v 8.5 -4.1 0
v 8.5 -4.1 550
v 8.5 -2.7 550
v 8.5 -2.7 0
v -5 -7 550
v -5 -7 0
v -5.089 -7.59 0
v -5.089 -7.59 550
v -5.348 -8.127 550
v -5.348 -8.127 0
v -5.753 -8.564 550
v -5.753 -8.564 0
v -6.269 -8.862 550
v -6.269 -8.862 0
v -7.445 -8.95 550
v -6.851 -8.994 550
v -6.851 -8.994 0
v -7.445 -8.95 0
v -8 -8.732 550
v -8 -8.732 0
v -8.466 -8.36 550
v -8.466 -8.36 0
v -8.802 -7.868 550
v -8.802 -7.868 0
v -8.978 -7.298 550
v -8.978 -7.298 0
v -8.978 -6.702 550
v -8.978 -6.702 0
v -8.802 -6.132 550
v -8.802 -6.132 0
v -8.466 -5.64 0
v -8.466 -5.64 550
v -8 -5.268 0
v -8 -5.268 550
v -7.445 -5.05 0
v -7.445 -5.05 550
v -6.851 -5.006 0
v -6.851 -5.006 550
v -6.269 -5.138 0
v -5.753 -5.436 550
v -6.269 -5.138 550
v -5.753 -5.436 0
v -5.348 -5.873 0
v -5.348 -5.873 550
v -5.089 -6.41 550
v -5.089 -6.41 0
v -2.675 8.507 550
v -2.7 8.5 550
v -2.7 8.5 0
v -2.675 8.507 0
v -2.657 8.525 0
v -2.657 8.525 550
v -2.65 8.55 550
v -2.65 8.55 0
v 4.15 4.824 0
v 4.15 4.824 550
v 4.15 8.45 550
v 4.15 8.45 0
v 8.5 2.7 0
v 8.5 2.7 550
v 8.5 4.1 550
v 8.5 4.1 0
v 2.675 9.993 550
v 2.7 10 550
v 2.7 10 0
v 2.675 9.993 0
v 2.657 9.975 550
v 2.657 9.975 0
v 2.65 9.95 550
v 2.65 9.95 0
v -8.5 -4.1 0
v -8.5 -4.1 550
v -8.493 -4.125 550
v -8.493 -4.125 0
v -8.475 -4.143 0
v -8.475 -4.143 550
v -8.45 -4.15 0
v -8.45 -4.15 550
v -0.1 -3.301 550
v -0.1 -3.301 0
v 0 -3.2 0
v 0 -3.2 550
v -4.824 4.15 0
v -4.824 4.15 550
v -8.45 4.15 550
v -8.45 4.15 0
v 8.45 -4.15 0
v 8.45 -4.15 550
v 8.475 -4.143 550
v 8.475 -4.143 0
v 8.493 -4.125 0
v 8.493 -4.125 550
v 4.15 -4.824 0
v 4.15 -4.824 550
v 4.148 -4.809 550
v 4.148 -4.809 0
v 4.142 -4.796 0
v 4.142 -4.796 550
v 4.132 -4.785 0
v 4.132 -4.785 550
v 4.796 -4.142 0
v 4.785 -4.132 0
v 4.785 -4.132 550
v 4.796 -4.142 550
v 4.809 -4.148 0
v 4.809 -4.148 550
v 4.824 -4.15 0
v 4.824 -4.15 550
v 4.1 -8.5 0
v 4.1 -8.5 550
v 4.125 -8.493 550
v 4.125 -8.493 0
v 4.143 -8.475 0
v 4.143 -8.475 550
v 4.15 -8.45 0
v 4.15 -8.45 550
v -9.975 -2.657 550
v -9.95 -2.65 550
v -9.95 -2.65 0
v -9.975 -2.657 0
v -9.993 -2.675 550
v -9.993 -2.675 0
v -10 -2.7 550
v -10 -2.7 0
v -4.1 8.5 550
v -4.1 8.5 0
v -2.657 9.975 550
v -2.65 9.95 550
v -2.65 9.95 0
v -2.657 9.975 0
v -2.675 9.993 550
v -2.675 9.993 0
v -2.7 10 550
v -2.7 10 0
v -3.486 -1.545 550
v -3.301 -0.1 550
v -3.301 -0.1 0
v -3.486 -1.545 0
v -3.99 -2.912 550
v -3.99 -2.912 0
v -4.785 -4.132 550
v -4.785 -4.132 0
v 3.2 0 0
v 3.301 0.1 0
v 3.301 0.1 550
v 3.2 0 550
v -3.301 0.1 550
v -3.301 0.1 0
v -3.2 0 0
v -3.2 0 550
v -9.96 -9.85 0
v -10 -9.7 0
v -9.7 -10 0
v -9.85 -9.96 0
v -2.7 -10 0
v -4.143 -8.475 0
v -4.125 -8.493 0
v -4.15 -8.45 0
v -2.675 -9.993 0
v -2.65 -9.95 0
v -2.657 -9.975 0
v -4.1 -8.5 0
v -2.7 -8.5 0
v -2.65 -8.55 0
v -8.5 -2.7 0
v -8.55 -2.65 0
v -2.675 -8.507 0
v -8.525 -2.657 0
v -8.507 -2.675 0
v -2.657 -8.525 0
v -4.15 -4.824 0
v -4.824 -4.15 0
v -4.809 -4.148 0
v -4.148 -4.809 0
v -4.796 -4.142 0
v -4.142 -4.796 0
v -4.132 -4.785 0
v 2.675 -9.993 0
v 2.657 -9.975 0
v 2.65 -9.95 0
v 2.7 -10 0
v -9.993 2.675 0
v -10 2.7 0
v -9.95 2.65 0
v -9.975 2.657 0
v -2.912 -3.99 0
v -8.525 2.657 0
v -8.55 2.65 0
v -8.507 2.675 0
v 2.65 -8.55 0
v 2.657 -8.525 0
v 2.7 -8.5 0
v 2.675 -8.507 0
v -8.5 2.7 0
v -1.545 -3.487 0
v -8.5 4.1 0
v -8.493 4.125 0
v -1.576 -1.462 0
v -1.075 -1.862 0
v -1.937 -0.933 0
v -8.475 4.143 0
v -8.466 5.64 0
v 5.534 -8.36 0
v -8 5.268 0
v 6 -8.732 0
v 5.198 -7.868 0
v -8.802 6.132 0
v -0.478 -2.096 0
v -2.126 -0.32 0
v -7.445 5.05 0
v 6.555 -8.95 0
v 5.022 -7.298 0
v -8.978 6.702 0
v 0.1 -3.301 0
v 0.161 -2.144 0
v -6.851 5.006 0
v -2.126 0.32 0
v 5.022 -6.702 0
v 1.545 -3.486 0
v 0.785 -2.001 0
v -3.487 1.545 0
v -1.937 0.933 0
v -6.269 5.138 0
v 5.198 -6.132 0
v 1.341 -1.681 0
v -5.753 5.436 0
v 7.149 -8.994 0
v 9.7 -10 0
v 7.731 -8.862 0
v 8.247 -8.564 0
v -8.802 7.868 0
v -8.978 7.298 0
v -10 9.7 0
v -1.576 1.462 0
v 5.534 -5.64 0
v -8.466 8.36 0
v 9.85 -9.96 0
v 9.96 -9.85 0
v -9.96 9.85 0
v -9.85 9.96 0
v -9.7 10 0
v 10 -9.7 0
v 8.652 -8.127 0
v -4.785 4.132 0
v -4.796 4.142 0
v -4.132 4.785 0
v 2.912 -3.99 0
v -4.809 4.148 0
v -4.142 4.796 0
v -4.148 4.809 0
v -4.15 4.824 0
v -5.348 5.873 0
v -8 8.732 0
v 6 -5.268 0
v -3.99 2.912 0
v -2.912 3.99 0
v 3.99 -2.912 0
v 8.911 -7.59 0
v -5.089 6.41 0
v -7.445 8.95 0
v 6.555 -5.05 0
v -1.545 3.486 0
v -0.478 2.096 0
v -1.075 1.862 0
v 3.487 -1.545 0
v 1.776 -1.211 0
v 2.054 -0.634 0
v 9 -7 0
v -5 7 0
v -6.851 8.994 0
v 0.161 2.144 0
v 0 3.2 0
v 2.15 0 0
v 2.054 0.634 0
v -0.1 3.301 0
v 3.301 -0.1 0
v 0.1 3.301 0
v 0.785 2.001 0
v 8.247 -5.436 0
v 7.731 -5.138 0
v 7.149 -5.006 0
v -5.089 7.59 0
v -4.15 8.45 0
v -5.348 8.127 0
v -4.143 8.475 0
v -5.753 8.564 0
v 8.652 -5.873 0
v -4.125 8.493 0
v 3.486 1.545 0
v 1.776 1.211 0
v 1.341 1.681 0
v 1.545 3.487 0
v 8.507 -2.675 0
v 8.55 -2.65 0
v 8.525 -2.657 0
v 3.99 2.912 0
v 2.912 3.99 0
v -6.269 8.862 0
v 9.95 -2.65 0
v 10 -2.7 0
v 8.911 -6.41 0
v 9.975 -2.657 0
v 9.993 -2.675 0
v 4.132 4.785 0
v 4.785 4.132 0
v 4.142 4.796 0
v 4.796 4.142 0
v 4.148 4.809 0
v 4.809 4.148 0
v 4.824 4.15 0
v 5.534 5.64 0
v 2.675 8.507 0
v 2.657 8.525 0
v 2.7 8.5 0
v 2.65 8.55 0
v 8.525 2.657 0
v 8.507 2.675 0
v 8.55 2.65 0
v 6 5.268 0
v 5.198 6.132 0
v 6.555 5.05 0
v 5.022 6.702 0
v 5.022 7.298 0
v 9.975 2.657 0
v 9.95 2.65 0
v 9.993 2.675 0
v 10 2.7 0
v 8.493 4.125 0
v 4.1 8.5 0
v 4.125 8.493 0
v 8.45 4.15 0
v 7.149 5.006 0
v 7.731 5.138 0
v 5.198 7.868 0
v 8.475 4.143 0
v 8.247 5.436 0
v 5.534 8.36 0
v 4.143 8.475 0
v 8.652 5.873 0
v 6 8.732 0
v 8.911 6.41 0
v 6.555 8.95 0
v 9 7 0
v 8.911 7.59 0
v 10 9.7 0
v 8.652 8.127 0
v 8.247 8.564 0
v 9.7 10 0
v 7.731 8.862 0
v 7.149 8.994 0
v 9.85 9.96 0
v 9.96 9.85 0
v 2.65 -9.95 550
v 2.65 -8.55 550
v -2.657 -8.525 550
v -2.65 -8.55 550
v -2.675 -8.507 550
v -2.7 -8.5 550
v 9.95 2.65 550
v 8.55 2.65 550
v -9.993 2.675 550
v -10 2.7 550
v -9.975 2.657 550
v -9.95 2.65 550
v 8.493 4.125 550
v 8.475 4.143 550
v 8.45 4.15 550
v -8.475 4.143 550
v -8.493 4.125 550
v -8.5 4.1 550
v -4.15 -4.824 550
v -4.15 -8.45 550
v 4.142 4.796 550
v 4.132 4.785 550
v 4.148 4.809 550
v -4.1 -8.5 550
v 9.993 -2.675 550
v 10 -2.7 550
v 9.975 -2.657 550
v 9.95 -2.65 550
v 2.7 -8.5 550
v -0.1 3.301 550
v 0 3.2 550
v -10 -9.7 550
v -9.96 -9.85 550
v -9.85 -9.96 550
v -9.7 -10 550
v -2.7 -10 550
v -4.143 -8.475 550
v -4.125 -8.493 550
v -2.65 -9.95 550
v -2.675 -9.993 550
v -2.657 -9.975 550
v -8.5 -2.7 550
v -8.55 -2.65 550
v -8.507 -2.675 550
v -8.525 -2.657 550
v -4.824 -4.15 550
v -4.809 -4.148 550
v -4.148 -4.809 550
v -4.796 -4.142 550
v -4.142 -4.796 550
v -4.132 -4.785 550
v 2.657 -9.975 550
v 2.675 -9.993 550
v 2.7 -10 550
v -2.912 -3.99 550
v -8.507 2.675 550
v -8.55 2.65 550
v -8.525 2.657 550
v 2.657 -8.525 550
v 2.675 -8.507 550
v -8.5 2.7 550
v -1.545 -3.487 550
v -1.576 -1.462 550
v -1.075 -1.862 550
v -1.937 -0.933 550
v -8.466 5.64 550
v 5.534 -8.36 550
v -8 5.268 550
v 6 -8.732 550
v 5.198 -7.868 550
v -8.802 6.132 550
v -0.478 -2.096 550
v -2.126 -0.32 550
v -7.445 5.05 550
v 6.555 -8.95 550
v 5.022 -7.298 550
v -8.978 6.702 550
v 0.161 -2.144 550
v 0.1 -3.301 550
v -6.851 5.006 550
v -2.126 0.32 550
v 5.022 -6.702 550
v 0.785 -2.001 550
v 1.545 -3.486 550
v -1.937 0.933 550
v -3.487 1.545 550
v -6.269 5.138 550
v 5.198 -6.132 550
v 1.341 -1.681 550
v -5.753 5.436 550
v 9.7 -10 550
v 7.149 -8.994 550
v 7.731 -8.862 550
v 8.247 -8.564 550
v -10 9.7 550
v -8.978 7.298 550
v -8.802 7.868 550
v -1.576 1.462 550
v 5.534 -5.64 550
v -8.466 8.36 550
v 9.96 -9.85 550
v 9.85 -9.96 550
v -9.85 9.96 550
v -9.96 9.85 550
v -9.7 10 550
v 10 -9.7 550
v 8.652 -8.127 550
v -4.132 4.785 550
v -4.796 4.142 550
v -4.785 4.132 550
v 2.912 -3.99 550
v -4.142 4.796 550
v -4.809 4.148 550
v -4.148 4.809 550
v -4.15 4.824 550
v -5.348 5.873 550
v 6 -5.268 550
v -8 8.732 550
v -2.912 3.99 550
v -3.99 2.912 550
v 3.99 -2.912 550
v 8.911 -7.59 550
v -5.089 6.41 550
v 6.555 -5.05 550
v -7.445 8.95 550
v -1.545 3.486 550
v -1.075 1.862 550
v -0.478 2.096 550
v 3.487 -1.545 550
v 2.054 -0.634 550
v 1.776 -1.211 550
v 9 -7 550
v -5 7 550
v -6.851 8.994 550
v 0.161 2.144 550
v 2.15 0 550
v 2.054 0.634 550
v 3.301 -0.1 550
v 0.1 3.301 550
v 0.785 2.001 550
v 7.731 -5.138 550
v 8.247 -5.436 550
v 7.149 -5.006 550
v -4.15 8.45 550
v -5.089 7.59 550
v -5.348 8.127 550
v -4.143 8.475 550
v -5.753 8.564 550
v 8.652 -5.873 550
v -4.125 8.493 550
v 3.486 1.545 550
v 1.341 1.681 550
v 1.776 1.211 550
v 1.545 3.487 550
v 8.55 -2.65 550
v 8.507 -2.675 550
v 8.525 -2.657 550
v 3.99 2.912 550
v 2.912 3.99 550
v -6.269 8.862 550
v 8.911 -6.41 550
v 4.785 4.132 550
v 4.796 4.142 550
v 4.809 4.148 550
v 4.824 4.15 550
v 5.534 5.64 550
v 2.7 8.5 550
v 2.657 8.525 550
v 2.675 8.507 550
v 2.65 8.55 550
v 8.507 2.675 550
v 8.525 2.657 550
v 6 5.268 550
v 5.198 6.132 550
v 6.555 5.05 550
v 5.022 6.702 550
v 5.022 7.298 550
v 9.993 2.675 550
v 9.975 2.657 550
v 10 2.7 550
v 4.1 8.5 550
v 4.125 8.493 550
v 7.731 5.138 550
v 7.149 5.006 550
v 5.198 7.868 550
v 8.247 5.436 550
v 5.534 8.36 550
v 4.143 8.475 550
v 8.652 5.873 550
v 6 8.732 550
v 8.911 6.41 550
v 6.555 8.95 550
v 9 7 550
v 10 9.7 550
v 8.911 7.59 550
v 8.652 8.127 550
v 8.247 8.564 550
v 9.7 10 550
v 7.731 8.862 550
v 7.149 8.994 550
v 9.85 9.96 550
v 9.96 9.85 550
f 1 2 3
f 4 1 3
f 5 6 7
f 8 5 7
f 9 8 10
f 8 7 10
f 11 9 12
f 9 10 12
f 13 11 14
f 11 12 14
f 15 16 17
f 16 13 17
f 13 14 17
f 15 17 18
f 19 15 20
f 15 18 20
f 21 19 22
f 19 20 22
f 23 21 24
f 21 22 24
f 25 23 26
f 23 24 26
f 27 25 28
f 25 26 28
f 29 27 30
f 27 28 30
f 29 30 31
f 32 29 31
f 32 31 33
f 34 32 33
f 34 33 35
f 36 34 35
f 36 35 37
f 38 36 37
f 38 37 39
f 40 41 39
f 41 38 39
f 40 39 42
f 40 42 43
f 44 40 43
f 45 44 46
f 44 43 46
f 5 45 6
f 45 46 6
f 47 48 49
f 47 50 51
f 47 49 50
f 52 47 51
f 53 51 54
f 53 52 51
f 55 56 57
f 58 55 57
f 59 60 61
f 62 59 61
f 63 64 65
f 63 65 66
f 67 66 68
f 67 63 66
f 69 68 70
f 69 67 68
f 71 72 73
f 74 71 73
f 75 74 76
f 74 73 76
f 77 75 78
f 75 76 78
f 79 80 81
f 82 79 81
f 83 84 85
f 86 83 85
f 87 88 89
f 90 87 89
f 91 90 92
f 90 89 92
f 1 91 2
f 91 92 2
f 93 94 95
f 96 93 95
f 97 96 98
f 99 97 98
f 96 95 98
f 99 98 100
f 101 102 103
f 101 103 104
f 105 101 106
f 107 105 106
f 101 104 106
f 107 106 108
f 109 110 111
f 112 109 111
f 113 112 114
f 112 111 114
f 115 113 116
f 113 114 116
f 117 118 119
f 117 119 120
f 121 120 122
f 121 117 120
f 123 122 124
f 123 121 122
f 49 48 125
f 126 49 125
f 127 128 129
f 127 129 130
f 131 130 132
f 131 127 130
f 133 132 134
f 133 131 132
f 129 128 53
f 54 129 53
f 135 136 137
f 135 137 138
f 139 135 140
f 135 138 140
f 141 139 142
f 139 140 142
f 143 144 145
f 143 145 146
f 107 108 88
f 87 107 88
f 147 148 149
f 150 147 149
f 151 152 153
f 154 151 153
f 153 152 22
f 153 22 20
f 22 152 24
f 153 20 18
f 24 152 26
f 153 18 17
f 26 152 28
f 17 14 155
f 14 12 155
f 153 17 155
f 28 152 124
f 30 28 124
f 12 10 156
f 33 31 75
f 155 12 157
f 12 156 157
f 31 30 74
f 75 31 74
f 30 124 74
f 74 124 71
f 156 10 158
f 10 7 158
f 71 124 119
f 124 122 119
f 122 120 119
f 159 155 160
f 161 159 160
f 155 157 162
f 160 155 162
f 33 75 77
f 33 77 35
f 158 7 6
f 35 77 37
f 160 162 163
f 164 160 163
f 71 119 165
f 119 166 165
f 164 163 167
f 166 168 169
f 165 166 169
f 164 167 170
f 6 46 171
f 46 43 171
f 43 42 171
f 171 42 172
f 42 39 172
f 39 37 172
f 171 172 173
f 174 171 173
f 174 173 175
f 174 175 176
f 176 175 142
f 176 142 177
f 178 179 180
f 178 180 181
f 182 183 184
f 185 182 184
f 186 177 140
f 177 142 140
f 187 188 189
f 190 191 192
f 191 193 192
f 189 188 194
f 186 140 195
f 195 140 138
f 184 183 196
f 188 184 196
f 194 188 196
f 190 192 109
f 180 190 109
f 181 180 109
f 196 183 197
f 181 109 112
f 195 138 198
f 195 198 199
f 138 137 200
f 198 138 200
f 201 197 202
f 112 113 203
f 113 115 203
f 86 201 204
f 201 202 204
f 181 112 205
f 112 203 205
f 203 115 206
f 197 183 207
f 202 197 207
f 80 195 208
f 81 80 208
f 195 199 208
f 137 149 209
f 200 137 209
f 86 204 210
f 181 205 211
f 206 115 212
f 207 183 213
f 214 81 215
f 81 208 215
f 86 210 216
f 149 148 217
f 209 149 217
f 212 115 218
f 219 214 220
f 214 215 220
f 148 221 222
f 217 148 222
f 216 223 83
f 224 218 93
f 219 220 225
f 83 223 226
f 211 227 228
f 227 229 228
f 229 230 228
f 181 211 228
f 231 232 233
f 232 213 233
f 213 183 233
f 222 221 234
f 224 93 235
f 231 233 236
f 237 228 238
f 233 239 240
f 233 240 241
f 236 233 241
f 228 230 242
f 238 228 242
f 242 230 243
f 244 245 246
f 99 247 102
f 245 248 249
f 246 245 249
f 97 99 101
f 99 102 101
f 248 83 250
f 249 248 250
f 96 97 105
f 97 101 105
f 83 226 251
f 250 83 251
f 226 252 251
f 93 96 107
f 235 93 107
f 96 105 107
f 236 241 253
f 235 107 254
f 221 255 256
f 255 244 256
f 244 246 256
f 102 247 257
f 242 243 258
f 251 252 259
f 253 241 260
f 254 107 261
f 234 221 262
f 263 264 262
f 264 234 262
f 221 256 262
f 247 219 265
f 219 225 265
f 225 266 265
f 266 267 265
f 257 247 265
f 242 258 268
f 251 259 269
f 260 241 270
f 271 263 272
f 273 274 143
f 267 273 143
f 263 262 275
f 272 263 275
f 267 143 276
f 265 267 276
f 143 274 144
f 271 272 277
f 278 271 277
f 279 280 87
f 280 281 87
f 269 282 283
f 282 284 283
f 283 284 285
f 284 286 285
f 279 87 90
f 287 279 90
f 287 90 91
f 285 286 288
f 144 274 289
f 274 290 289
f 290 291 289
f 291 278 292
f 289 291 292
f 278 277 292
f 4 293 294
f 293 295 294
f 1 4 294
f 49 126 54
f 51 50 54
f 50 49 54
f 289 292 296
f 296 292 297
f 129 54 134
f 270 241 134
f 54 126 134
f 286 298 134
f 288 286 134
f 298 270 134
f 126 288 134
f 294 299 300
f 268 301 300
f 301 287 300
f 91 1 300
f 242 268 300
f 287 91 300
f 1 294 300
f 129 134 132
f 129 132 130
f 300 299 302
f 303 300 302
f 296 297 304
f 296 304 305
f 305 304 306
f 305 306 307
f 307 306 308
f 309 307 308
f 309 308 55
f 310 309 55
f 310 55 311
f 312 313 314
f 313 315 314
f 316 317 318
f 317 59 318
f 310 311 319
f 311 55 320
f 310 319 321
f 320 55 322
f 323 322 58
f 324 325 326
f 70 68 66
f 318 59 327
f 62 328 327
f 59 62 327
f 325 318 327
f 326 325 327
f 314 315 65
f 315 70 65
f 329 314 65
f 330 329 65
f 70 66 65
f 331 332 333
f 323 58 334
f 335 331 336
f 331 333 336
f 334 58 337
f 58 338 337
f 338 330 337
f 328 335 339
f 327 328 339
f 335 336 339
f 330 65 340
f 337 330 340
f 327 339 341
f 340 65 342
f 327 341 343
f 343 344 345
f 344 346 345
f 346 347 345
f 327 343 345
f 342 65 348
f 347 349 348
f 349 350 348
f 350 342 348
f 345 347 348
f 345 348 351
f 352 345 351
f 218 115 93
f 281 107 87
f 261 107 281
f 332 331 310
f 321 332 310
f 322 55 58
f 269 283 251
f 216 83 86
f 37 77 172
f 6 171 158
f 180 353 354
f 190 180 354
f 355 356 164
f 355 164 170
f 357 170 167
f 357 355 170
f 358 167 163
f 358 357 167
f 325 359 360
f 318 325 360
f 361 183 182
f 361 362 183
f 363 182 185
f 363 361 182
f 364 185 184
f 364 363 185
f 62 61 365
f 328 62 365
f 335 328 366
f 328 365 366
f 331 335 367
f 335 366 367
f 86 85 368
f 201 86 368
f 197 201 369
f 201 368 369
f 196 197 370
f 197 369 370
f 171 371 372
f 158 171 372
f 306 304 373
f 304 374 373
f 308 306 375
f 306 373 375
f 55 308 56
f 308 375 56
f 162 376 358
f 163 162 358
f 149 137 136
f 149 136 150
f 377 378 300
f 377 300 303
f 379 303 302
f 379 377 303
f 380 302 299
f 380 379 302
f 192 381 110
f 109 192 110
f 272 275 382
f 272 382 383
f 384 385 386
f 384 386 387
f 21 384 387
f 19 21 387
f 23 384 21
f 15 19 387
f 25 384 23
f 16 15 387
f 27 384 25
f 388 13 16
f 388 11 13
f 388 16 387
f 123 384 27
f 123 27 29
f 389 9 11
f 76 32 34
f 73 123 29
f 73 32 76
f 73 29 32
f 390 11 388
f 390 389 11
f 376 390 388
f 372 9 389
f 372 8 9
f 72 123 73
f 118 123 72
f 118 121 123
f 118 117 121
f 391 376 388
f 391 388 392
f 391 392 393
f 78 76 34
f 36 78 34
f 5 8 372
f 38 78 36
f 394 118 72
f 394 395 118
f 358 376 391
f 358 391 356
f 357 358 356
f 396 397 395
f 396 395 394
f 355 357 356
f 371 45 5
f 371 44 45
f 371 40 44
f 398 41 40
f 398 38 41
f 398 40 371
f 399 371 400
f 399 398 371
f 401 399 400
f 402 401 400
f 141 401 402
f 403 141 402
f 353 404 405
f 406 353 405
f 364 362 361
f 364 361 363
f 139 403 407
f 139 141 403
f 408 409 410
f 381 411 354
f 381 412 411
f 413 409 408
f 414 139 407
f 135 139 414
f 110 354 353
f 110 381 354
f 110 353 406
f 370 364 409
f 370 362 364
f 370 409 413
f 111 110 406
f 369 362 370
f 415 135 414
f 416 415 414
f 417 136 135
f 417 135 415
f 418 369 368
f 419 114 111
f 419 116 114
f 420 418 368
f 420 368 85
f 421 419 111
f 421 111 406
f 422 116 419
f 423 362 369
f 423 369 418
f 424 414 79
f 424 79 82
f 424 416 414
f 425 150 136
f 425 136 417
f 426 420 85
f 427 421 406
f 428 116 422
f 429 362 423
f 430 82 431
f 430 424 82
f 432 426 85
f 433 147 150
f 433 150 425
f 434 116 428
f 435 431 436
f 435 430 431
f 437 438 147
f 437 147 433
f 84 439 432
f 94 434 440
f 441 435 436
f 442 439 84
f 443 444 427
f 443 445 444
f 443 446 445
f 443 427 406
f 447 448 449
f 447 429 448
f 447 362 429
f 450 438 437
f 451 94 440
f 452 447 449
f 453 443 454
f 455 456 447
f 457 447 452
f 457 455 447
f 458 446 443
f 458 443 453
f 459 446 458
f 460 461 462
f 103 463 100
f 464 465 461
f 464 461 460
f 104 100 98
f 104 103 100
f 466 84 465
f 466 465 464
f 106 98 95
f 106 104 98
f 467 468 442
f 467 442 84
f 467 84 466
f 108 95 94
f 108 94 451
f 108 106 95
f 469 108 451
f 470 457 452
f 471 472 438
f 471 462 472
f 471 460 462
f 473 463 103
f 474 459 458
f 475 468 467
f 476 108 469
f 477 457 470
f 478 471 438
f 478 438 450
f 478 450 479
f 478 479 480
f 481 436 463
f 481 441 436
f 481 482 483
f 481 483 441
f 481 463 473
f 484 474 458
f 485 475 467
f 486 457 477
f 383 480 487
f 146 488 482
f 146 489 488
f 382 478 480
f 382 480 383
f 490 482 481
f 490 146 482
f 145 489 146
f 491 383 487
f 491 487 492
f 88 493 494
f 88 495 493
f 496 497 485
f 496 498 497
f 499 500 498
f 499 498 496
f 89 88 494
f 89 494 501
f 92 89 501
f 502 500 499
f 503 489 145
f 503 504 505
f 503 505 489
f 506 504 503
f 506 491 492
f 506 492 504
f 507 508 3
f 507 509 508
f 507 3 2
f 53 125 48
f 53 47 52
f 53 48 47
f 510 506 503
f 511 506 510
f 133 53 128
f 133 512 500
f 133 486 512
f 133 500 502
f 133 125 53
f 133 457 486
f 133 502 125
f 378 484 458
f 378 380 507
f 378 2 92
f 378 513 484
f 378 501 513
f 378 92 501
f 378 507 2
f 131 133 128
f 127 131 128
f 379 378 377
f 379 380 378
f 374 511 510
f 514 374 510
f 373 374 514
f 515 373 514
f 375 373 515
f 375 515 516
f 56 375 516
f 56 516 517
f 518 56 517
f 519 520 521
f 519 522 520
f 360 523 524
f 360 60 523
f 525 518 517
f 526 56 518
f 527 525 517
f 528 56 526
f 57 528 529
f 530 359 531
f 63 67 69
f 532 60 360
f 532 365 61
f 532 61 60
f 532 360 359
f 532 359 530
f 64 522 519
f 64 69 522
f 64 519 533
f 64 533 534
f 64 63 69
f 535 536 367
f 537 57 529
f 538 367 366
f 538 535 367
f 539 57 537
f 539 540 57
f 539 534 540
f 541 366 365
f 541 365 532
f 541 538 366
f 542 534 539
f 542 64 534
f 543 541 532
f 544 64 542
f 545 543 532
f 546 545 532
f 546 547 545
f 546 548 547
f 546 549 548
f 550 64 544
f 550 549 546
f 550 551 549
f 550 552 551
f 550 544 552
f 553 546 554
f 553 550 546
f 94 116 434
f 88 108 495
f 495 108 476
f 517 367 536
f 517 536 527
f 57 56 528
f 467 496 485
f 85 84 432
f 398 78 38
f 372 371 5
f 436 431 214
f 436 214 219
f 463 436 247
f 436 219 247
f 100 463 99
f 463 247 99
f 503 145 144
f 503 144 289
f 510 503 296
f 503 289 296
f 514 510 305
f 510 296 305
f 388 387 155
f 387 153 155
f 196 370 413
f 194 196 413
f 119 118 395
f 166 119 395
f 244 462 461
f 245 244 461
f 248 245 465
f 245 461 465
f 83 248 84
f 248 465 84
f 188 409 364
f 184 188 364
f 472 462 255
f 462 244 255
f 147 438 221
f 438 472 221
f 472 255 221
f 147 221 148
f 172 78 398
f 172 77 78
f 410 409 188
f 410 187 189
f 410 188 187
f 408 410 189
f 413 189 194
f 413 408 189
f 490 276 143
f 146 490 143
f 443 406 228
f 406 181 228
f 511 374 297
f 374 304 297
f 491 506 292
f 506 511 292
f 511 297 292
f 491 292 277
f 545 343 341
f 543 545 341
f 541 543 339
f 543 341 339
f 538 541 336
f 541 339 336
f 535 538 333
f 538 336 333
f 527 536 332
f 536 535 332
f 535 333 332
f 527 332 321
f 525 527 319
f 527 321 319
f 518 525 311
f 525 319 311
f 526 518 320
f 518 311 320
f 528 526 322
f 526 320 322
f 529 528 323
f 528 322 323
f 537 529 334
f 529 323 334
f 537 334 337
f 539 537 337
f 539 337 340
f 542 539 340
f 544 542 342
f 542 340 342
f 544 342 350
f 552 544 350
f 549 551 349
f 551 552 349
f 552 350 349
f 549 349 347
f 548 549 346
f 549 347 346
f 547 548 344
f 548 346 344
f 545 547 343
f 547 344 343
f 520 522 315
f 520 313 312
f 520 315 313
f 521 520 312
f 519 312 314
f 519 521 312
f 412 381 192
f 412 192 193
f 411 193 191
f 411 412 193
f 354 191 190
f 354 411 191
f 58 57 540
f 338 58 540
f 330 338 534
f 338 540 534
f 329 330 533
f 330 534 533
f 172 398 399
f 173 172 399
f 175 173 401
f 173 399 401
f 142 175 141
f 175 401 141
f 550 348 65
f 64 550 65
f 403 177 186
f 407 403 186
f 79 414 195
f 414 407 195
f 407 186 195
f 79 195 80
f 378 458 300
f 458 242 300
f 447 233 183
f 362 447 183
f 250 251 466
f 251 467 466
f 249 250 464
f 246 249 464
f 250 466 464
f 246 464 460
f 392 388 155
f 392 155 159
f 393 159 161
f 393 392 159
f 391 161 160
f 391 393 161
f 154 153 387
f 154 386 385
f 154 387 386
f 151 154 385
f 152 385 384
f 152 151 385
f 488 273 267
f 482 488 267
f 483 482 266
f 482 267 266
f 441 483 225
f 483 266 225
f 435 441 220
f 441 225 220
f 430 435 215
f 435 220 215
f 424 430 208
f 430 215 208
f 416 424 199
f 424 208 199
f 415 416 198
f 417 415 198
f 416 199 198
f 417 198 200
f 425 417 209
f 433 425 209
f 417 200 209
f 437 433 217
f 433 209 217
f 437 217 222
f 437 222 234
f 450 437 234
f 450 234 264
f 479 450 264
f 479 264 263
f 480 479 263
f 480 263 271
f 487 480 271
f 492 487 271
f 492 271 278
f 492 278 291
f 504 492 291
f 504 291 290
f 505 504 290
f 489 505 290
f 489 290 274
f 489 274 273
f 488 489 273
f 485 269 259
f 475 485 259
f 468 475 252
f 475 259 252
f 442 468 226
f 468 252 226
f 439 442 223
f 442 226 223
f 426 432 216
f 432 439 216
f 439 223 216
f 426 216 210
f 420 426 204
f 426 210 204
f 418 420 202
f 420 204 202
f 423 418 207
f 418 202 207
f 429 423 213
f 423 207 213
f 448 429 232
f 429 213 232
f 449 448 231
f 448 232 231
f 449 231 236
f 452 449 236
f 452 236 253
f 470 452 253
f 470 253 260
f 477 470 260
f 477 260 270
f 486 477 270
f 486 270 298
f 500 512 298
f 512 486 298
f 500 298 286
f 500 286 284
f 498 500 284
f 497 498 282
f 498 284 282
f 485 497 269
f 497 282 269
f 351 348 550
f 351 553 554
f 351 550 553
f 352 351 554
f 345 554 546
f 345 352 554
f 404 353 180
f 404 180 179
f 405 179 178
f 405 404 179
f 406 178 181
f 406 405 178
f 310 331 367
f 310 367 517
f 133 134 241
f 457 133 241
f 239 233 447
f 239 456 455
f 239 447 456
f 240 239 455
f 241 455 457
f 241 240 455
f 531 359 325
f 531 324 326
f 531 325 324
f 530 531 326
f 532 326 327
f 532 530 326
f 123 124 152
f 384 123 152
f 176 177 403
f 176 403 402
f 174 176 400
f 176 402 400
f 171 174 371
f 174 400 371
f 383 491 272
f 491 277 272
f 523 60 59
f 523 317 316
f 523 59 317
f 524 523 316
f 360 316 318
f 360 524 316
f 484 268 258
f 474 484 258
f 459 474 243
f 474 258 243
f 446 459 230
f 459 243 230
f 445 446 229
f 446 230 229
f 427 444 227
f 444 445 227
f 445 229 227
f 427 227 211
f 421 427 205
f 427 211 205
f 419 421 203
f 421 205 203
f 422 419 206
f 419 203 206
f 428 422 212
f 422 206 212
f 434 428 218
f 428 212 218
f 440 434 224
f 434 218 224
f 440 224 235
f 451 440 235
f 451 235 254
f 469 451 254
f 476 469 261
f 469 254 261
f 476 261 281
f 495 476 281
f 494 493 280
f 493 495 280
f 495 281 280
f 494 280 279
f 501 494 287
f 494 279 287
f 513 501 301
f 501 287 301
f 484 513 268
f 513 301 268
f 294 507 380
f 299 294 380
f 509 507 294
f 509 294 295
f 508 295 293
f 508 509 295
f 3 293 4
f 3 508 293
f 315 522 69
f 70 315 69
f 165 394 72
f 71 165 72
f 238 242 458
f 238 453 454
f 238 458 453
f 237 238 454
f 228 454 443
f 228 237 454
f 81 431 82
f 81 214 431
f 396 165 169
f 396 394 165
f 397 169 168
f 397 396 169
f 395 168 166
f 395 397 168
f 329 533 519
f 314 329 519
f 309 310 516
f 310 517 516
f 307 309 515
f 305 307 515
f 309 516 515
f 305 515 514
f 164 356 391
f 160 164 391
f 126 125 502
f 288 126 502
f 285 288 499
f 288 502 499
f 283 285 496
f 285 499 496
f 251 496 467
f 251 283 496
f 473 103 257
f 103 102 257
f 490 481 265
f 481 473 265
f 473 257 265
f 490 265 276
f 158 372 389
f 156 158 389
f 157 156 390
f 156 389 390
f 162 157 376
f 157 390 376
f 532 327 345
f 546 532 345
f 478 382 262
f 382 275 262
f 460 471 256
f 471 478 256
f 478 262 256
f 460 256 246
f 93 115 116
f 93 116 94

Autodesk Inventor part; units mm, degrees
ref_plane "YZ Plane" through (0, 0, 0) normal (1, 0, 0) x (0, 1, 0)
ref_plane "XZ Plane" through (0, 0, 0) normal (0, 1, 0) x (-1, 0, 0)
ref_plane "XY Plane" through (0, 0, 0) normal (0, 0, 1) x (1, 0, 0)
sketch "스케치1" plane through (0, 0, 0) normal (0, 0, 1) x (1, 0, 0)
  line L0 (-9.7, -10) -> (9.7, -10)
  line L1 (10, -9.7) -> (10, 9.7)
  line L2 (9.7, 10) -> (-9.7, 10)
  line L3 (-10, 9.7) -> (-10, -9.7)
  line L4 (-10, -10) -> (10, 10) construction
  line L5 (10, -10) -> (-10, 10) construction
  circle A0 centre (-7, 7) radius 2
  line L6 (0, 15.6683) -> (0, -20)
  line L7 (-22.0072, 0) -> (22.0072, 0)
  circle A1 centre (0, 0) radius 2.15
  arc A2 (-9.7, 10) -> (-10, 9.7) centre (-9.7, 9.7) ccw
  arc A3 (10, 9.7) -> (9.7, 10) centre (9.7, 9.7) ccw
  arc A4 (9.7, -10) -> (10, -9.7) centre (9.7, -9.7) ccw
  arc A5 (-10, -9.7) -> (-9.7, -10) centre (-9.7, -9.7) ccw
  line L8 (-2.65, 10) -> (-2.65, 8.5)
  line L9 (-2.65, 8.5) -> (-4.15, 8.5)
  line L10 (-4.15, 8.5) -> (-4.15, 4.8)
  line L11 (4.15, 4.8) -> (4.15, 8.5)
  line L12 (4.15, 8.5) -> (2.65, 8.5)
  line L13 (2.65, 8.5) -> (2.65, 10)
  line L14 (-0.1, 3.3008) -> (0, 3.2)
  line L15 (0.1, 3.3008) -> (0, 3.2)
  arc A6 (-4.15, 4.8) -> (-0.1, 3.3008) centre (0, 9.7908) ccw
  arc A7 (0.1, 3.3008) -> (4.15, 4.8) centre (0, 9.7908) ccw
  circle A8 centre (7, 7) radius 2
  circle A9 centre (-7, -7) radius 2
  circle A10 centre (7, -7) radius 2
  line L16 (-3.3008, 0.1) -> (-3.2, 0)
  line L17 (-3.3008, -0.1) -> (-3.2, 0)
  arc A11 (-4.8, -4.15) -> (-3.3008, -0.1) centre (-9.7908, 0) ccw
  line L18 (-8.5, -4.15) -> (-4.8, -4.15)
  line L19 (-10, -2.65) -> (-8.5, -2.65)
  line L20 (-8.5, 2.65) -> (-10, 2.65)
  arc A12 (-3.3008, 0.1) -> (-4.8, 4.15) centre (-9.7908, 0) ccw
  line L21 (-4.8, 4.15) -> (-8.5, 4.15)
  line L22 (-8.5, 4.15) -> (-8.5, 2.65)
  line L23 (-8.5, -2.65) -> (-8.5, -4.15)
  line L24 (-0.1, -3.3008) -> (0, -3.2)
  line L25 (0.1, -3.3008) -> (0, -3.2)
  arc A13 (4.15, -4.8) -> (0.1, -3.3008) centre (0, -9.7908) ccw
  line L26 (4.15, -8.5) -> (4.15, -4.8)
  line L27 (2.65, -10) -> (2.65, -8.5)
  line L28 (-2.65, -8.5) -> (-2.65, -10)
  arc A14 (-0.1, -3.3008) -> (-4.15, -4.8) centre (0, -9.7908) ccw
  line L29 (-4.15, -4.8) -> (-4.15, -8.5)
  line L30 (-4.15, -8.5) -> (-2.65, -8.5)
  line L31 (2.65, -8.5) -> (4.15, -8.5)
  line L32 (3.3008, -0.1) -> (3.2, 0)
  line L33 (3.3008, 0.1) -> (3.2, 0)
  arc A15 (4.8, 4.15) -> (3.3008, 0.1) centre (9.7908, 0) ccw
  line L34 (8.5, 4.15) -> (4.8, 4.15)
  line L35 (10, 2.65) -> (8.5, 2.65)
  line L36 (8.5, -2.65) -> (10, -2.65)
  arc A16 (3.3008, -0.1) -> (4.8, -4.15) centre (9.7908, 0) ccw
  line L37 (4.8, -4.15) -> (8.5, -4.15)
  line L38 (8.5, -4.15) -> (8.5, -2.65)
  line L39 (8.5, 2.65) -> (8.5, 4.15)
  point P0 (2.65, 9.25)
  point P1 (-2.65, 9.25)
  point P2 (-4.15, 6.65)
  point P3 (0, 3.3)
  point P4 (-3.3, 0)
  point P5 (-9.25, -2.65)
  point P6 (-6.65, -4.15)
  point P7 (-9.25, 2.65)
  point P8 (0, -3.3)
  point P9 (2.65, -9.25)
  point P10 (4.15, -6.65)
  point P11 (-2.65, -9.25)
  point P12 (3.3, 0)
  point P13 (9.25, 2.65)
  point P14 (6.65, 4.15)
  point P15 (9.25, -2.65)
  dimension "d0" = 20
  dimension "d1" = 20
  dimension "d2" = 4
  dimension "d3" = 14
  dimension "d4" = 14
  dimension "d5" = 4.3
  dimension "d6" = 0.3
  dimension "d9" = 8.3
  dimension "d10" = 5.3
  dimension "d11" = 5.3
  dimension "d12" = 1.5
  dimension "d15" = 0.1
  dimension "d16" = 0.1
  dimension "d17" = 0.1
  dimension "d19" = 3.7
  dimension "d22" = 360
extrude "프로파일 길이 설정" add sketch "스케치1" along normal blind 550 contours A5 L3 L19 L23 L18 A11 L17 L7 A1 L6 L24 A14 L29 L30 L28 L0 | L27 L31 L26 A13 L25 L6 A1 L7 L32 A16 L37 L38 L36 L1 A4 L0 | L3 A2 L2 L8 L9 L10 A6 L14 L6 A1 L7 L16 A12 L21 L22 L20 | A1 L6 L15 A7 L11 L12 L13 L2 A3 L1 L35 L39 L34 A15 L33 L7
fillet "모서리" radius 0.05 32 edges at (10, 2.65, 275) (8.5, 2.65, 275) (8.5, 4.15, 275) (10, -2.65, 275) (8.5, -2.65, 275) (8.5, -4.15, 275) (2.65, 8.5, 275) (2.65, 10, 275) (4.15, 8.5, 275) (-4.15, 8.5, 275) (-2.65, 8.5, 275) (-2.65, 10, 275) (-10, 2.65, 275) (-8.5, 2.65, 275) (-8.5, 4.15, 275) (-8.5, -4.15, 275) (-8.5, -2.65, 275) (-10, -2.65, 275) (-2.65, -10, 275) (-2.65, -8.5, 275) (-4.15, -8.5, 275) (2.65, -8.5, 275) (4.15, -8.5, 275) (2.65, -10, 275) (4.15, -4.8, 275) (-4.15, -4.8, 275) (-4.8, -4.15, 275) (-4.8, 4.15, 275) (-4.15, 4.8, 275) (4.15, 4.8, 275) (4.8, -4.15, 275) (4.8, 4.15, 275)
equation "\"d0\" = d1"
equation "\"d11\" = d10"
equation "\"d17\" = d16"
properties part number "20x20x550"
